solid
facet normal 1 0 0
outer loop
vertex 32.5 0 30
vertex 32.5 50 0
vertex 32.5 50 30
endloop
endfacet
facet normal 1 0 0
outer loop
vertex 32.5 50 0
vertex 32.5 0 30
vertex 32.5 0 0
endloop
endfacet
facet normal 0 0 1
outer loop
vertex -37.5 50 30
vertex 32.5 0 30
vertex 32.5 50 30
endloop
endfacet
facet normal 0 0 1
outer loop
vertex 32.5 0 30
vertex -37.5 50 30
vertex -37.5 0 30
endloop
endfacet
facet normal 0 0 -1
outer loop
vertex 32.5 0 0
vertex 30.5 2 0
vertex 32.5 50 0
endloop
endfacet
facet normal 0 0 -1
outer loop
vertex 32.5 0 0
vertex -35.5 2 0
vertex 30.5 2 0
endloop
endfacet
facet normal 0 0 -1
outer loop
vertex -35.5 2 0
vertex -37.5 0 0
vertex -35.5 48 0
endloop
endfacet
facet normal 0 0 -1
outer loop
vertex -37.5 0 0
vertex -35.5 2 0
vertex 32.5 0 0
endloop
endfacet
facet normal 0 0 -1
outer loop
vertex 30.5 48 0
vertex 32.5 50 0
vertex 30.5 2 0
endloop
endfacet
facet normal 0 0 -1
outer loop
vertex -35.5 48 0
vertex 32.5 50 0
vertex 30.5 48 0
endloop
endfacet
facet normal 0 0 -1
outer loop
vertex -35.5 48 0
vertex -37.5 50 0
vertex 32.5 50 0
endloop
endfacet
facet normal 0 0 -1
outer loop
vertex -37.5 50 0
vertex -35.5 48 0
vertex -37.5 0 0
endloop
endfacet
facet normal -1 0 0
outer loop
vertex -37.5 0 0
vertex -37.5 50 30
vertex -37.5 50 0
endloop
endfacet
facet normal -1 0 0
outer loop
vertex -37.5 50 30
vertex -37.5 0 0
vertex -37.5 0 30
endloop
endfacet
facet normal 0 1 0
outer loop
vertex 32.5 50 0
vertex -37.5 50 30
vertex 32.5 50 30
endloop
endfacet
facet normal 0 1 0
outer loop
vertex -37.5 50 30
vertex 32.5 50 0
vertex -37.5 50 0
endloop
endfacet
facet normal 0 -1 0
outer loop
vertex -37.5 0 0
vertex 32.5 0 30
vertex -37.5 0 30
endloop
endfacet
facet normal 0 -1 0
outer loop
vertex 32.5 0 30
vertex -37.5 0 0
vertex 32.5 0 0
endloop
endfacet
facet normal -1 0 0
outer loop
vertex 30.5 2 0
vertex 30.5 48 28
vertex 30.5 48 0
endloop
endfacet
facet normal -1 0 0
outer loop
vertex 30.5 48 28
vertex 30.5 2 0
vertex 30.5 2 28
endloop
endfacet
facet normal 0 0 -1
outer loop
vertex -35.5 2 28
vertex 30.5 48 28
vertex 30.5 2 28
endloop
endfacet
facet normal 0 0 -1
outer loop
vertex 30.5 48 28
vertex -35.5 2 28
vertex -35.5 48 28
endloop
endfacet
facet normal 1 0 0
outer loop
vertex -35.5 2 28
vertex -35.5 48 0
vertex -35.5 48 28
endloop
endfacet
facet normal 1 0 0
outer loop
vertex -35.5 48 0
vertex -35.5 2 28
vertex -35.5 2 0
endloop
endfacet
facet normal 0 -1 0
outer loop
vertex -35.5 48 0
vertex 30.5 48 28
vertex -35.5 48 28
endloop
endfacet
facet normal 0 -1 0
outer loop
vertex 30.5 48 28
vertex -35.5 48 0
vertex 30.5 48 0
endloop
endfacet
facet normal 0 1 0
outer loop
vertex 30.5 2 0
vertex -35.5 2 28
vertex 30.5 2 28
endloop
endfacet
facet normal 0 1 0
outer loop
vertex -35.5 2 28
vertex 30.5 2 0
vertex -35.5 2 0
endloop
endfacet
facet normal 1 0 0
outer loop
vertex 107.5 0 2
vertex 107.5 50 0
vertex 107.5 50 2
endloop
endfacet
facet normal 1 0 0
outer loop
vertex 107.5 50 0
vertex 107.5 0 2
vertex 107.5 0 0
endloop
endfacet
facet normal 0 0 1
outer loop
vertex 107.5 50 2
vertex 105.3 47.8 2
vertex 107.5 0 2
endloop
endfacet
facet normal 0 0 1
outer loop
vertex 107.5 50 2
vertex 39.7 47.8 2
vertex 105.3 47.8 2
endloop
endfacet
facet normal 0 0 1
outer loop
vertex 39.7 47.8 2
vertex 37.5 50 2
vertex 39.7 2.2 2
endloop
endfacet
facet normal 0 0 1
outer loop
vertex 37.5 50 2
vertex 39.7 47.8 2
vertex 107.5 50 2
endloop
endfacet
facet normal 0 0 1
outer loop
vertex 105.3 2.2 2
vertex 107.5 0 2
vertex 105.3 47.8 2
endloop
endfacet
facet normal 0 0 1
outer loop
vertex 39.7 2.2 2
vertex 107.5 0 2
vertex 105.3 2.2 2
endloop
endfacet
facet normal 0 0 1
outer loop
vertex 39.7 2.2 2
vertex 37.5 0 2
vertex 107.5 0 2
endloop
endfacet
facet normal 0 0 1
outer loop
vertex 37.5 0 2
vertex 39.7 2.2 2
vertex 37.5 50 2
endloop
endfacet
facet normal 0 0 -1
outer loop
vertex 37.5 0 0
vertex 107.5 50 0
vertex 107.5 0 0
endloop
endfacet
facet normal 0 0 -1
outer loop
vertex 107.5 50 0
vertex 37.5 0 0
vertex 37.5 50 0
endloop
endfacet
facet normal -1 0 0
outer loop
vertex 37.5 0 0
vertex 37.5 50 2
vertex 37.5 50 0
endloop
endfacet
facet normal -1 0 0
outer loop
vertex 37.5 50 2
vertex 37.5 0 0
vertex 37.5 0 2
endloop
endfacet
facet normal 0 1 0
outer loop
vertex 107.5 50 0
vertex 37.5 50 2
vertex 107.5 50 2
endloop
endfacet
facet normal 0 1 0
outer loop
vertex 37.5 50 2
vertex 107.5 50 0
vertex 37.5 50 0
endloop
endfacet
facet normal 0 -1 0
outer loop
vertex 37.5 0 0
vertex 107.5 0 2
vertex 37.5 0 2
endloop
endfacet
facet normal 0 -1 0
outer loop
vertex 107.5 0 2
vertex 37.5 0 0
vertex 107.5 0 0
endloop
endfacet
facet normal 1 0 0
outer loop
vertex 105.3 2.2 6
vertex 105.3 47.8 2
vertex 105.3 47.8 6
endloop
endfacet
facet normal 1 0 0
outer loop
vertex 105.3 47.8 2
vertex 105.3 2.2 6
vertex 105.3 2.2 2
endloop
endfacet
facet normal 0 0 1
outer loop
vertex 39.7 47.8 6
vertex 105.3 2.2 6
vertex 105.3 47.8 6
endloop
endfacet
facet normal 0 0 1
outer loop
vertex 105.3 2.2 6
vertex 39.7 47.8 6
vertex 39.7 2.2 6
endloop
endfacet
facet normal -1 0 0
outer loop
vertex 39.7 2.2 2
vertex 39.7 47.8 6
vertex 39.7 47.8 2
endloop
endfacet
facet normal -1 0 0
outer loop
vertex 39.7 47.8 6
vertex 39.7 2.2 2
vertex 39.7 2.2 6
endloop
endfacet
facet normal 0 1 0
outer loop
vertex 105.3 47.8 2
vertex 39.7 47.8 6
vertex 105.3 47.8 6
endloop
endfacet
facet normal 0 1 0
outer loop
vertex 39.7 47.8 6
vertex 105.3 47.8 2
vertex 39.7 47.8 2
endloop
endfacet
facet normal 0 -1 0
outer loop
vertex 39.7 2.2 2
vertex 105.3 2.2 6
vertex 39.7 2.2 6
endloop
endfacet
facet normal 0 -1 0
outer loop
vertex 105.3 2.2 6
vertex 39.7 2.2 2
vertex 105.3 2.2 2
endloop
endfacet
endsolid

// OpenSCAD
// --- Dimensions ---
// Outer box length (X)
box_L = 70;
// Outer box width (Y)
box_W = 50;
// Outer box height (Z)
box_H = 30;
// Wall thickness
wall_t = 2;
// Floor thickness
floor_t = 2;
// Lid plate thickness
lid_plate_t = 2;
// Lip wall thickness
lip_t = 1.5;
// Lip height
lip_H = 4;
// Lip outer length
lip_L = 65.6;
// Lip outer width
lip_W = 45.6;
// Clearance on each side between lip and box opening
clearance = 0.2;
// Gap between parts on bed
gap = 10;

// Derived: Inner box dimensions
box_inner_L = box_L - 2 * wall_t;
box_inner_W = box_W - 2 * wall_t;
box_inner_H = box_H - floor_t;

// Derived: Box opening dimensions (where lip slides in)
box_open_L = box_inner_L - 2 * clearance;
box_open_W = box_inner_W - 2 * clearance;

// Derived: Position of box centre on bed
box_cx = -(box_L + gap/2) / 2;
box_cy = 0;

// Derived: Position of lid centre on bed
lid_cx = (box_L + gap/2) / 2;
lid_cy = 0;

// --- Part 1: Box ---
translate([box_cx, box_cy, 0]) {
    difference() {
        // Outer shell
        cube([box_L, box_W, box_H], center = false);
        
        // Inner cavity (subtract to create hollow box)
        // Extend slightly past bottom to ensure clean cut
        translate([wall_t, wall_t, -0.01])
            cube([box_inner_L, box_inner_W, box_inner_H + 0.01], center = false);
    }
}

// --- Part 2: Lid (printed upside down) ---
translate([lid_cx, lid_cy, 0]) {
    difference() {
        union() {
            // Plate (lying on bed)
            cube([box_L, box_W, lid_plate_t], center = false);
            
            // Lip (extruded upward from plate)
            // Since lid is printed upside down, the lip points up (toward the box opening)
            translate([(box_L - lip_L)/2, (box_W - lip_W)/2, lid_plate_t])
                cube([lip_L, lip_W, lip_H], center = false);
        }
        
        // No internal cavities needed for the lid
    }
}
